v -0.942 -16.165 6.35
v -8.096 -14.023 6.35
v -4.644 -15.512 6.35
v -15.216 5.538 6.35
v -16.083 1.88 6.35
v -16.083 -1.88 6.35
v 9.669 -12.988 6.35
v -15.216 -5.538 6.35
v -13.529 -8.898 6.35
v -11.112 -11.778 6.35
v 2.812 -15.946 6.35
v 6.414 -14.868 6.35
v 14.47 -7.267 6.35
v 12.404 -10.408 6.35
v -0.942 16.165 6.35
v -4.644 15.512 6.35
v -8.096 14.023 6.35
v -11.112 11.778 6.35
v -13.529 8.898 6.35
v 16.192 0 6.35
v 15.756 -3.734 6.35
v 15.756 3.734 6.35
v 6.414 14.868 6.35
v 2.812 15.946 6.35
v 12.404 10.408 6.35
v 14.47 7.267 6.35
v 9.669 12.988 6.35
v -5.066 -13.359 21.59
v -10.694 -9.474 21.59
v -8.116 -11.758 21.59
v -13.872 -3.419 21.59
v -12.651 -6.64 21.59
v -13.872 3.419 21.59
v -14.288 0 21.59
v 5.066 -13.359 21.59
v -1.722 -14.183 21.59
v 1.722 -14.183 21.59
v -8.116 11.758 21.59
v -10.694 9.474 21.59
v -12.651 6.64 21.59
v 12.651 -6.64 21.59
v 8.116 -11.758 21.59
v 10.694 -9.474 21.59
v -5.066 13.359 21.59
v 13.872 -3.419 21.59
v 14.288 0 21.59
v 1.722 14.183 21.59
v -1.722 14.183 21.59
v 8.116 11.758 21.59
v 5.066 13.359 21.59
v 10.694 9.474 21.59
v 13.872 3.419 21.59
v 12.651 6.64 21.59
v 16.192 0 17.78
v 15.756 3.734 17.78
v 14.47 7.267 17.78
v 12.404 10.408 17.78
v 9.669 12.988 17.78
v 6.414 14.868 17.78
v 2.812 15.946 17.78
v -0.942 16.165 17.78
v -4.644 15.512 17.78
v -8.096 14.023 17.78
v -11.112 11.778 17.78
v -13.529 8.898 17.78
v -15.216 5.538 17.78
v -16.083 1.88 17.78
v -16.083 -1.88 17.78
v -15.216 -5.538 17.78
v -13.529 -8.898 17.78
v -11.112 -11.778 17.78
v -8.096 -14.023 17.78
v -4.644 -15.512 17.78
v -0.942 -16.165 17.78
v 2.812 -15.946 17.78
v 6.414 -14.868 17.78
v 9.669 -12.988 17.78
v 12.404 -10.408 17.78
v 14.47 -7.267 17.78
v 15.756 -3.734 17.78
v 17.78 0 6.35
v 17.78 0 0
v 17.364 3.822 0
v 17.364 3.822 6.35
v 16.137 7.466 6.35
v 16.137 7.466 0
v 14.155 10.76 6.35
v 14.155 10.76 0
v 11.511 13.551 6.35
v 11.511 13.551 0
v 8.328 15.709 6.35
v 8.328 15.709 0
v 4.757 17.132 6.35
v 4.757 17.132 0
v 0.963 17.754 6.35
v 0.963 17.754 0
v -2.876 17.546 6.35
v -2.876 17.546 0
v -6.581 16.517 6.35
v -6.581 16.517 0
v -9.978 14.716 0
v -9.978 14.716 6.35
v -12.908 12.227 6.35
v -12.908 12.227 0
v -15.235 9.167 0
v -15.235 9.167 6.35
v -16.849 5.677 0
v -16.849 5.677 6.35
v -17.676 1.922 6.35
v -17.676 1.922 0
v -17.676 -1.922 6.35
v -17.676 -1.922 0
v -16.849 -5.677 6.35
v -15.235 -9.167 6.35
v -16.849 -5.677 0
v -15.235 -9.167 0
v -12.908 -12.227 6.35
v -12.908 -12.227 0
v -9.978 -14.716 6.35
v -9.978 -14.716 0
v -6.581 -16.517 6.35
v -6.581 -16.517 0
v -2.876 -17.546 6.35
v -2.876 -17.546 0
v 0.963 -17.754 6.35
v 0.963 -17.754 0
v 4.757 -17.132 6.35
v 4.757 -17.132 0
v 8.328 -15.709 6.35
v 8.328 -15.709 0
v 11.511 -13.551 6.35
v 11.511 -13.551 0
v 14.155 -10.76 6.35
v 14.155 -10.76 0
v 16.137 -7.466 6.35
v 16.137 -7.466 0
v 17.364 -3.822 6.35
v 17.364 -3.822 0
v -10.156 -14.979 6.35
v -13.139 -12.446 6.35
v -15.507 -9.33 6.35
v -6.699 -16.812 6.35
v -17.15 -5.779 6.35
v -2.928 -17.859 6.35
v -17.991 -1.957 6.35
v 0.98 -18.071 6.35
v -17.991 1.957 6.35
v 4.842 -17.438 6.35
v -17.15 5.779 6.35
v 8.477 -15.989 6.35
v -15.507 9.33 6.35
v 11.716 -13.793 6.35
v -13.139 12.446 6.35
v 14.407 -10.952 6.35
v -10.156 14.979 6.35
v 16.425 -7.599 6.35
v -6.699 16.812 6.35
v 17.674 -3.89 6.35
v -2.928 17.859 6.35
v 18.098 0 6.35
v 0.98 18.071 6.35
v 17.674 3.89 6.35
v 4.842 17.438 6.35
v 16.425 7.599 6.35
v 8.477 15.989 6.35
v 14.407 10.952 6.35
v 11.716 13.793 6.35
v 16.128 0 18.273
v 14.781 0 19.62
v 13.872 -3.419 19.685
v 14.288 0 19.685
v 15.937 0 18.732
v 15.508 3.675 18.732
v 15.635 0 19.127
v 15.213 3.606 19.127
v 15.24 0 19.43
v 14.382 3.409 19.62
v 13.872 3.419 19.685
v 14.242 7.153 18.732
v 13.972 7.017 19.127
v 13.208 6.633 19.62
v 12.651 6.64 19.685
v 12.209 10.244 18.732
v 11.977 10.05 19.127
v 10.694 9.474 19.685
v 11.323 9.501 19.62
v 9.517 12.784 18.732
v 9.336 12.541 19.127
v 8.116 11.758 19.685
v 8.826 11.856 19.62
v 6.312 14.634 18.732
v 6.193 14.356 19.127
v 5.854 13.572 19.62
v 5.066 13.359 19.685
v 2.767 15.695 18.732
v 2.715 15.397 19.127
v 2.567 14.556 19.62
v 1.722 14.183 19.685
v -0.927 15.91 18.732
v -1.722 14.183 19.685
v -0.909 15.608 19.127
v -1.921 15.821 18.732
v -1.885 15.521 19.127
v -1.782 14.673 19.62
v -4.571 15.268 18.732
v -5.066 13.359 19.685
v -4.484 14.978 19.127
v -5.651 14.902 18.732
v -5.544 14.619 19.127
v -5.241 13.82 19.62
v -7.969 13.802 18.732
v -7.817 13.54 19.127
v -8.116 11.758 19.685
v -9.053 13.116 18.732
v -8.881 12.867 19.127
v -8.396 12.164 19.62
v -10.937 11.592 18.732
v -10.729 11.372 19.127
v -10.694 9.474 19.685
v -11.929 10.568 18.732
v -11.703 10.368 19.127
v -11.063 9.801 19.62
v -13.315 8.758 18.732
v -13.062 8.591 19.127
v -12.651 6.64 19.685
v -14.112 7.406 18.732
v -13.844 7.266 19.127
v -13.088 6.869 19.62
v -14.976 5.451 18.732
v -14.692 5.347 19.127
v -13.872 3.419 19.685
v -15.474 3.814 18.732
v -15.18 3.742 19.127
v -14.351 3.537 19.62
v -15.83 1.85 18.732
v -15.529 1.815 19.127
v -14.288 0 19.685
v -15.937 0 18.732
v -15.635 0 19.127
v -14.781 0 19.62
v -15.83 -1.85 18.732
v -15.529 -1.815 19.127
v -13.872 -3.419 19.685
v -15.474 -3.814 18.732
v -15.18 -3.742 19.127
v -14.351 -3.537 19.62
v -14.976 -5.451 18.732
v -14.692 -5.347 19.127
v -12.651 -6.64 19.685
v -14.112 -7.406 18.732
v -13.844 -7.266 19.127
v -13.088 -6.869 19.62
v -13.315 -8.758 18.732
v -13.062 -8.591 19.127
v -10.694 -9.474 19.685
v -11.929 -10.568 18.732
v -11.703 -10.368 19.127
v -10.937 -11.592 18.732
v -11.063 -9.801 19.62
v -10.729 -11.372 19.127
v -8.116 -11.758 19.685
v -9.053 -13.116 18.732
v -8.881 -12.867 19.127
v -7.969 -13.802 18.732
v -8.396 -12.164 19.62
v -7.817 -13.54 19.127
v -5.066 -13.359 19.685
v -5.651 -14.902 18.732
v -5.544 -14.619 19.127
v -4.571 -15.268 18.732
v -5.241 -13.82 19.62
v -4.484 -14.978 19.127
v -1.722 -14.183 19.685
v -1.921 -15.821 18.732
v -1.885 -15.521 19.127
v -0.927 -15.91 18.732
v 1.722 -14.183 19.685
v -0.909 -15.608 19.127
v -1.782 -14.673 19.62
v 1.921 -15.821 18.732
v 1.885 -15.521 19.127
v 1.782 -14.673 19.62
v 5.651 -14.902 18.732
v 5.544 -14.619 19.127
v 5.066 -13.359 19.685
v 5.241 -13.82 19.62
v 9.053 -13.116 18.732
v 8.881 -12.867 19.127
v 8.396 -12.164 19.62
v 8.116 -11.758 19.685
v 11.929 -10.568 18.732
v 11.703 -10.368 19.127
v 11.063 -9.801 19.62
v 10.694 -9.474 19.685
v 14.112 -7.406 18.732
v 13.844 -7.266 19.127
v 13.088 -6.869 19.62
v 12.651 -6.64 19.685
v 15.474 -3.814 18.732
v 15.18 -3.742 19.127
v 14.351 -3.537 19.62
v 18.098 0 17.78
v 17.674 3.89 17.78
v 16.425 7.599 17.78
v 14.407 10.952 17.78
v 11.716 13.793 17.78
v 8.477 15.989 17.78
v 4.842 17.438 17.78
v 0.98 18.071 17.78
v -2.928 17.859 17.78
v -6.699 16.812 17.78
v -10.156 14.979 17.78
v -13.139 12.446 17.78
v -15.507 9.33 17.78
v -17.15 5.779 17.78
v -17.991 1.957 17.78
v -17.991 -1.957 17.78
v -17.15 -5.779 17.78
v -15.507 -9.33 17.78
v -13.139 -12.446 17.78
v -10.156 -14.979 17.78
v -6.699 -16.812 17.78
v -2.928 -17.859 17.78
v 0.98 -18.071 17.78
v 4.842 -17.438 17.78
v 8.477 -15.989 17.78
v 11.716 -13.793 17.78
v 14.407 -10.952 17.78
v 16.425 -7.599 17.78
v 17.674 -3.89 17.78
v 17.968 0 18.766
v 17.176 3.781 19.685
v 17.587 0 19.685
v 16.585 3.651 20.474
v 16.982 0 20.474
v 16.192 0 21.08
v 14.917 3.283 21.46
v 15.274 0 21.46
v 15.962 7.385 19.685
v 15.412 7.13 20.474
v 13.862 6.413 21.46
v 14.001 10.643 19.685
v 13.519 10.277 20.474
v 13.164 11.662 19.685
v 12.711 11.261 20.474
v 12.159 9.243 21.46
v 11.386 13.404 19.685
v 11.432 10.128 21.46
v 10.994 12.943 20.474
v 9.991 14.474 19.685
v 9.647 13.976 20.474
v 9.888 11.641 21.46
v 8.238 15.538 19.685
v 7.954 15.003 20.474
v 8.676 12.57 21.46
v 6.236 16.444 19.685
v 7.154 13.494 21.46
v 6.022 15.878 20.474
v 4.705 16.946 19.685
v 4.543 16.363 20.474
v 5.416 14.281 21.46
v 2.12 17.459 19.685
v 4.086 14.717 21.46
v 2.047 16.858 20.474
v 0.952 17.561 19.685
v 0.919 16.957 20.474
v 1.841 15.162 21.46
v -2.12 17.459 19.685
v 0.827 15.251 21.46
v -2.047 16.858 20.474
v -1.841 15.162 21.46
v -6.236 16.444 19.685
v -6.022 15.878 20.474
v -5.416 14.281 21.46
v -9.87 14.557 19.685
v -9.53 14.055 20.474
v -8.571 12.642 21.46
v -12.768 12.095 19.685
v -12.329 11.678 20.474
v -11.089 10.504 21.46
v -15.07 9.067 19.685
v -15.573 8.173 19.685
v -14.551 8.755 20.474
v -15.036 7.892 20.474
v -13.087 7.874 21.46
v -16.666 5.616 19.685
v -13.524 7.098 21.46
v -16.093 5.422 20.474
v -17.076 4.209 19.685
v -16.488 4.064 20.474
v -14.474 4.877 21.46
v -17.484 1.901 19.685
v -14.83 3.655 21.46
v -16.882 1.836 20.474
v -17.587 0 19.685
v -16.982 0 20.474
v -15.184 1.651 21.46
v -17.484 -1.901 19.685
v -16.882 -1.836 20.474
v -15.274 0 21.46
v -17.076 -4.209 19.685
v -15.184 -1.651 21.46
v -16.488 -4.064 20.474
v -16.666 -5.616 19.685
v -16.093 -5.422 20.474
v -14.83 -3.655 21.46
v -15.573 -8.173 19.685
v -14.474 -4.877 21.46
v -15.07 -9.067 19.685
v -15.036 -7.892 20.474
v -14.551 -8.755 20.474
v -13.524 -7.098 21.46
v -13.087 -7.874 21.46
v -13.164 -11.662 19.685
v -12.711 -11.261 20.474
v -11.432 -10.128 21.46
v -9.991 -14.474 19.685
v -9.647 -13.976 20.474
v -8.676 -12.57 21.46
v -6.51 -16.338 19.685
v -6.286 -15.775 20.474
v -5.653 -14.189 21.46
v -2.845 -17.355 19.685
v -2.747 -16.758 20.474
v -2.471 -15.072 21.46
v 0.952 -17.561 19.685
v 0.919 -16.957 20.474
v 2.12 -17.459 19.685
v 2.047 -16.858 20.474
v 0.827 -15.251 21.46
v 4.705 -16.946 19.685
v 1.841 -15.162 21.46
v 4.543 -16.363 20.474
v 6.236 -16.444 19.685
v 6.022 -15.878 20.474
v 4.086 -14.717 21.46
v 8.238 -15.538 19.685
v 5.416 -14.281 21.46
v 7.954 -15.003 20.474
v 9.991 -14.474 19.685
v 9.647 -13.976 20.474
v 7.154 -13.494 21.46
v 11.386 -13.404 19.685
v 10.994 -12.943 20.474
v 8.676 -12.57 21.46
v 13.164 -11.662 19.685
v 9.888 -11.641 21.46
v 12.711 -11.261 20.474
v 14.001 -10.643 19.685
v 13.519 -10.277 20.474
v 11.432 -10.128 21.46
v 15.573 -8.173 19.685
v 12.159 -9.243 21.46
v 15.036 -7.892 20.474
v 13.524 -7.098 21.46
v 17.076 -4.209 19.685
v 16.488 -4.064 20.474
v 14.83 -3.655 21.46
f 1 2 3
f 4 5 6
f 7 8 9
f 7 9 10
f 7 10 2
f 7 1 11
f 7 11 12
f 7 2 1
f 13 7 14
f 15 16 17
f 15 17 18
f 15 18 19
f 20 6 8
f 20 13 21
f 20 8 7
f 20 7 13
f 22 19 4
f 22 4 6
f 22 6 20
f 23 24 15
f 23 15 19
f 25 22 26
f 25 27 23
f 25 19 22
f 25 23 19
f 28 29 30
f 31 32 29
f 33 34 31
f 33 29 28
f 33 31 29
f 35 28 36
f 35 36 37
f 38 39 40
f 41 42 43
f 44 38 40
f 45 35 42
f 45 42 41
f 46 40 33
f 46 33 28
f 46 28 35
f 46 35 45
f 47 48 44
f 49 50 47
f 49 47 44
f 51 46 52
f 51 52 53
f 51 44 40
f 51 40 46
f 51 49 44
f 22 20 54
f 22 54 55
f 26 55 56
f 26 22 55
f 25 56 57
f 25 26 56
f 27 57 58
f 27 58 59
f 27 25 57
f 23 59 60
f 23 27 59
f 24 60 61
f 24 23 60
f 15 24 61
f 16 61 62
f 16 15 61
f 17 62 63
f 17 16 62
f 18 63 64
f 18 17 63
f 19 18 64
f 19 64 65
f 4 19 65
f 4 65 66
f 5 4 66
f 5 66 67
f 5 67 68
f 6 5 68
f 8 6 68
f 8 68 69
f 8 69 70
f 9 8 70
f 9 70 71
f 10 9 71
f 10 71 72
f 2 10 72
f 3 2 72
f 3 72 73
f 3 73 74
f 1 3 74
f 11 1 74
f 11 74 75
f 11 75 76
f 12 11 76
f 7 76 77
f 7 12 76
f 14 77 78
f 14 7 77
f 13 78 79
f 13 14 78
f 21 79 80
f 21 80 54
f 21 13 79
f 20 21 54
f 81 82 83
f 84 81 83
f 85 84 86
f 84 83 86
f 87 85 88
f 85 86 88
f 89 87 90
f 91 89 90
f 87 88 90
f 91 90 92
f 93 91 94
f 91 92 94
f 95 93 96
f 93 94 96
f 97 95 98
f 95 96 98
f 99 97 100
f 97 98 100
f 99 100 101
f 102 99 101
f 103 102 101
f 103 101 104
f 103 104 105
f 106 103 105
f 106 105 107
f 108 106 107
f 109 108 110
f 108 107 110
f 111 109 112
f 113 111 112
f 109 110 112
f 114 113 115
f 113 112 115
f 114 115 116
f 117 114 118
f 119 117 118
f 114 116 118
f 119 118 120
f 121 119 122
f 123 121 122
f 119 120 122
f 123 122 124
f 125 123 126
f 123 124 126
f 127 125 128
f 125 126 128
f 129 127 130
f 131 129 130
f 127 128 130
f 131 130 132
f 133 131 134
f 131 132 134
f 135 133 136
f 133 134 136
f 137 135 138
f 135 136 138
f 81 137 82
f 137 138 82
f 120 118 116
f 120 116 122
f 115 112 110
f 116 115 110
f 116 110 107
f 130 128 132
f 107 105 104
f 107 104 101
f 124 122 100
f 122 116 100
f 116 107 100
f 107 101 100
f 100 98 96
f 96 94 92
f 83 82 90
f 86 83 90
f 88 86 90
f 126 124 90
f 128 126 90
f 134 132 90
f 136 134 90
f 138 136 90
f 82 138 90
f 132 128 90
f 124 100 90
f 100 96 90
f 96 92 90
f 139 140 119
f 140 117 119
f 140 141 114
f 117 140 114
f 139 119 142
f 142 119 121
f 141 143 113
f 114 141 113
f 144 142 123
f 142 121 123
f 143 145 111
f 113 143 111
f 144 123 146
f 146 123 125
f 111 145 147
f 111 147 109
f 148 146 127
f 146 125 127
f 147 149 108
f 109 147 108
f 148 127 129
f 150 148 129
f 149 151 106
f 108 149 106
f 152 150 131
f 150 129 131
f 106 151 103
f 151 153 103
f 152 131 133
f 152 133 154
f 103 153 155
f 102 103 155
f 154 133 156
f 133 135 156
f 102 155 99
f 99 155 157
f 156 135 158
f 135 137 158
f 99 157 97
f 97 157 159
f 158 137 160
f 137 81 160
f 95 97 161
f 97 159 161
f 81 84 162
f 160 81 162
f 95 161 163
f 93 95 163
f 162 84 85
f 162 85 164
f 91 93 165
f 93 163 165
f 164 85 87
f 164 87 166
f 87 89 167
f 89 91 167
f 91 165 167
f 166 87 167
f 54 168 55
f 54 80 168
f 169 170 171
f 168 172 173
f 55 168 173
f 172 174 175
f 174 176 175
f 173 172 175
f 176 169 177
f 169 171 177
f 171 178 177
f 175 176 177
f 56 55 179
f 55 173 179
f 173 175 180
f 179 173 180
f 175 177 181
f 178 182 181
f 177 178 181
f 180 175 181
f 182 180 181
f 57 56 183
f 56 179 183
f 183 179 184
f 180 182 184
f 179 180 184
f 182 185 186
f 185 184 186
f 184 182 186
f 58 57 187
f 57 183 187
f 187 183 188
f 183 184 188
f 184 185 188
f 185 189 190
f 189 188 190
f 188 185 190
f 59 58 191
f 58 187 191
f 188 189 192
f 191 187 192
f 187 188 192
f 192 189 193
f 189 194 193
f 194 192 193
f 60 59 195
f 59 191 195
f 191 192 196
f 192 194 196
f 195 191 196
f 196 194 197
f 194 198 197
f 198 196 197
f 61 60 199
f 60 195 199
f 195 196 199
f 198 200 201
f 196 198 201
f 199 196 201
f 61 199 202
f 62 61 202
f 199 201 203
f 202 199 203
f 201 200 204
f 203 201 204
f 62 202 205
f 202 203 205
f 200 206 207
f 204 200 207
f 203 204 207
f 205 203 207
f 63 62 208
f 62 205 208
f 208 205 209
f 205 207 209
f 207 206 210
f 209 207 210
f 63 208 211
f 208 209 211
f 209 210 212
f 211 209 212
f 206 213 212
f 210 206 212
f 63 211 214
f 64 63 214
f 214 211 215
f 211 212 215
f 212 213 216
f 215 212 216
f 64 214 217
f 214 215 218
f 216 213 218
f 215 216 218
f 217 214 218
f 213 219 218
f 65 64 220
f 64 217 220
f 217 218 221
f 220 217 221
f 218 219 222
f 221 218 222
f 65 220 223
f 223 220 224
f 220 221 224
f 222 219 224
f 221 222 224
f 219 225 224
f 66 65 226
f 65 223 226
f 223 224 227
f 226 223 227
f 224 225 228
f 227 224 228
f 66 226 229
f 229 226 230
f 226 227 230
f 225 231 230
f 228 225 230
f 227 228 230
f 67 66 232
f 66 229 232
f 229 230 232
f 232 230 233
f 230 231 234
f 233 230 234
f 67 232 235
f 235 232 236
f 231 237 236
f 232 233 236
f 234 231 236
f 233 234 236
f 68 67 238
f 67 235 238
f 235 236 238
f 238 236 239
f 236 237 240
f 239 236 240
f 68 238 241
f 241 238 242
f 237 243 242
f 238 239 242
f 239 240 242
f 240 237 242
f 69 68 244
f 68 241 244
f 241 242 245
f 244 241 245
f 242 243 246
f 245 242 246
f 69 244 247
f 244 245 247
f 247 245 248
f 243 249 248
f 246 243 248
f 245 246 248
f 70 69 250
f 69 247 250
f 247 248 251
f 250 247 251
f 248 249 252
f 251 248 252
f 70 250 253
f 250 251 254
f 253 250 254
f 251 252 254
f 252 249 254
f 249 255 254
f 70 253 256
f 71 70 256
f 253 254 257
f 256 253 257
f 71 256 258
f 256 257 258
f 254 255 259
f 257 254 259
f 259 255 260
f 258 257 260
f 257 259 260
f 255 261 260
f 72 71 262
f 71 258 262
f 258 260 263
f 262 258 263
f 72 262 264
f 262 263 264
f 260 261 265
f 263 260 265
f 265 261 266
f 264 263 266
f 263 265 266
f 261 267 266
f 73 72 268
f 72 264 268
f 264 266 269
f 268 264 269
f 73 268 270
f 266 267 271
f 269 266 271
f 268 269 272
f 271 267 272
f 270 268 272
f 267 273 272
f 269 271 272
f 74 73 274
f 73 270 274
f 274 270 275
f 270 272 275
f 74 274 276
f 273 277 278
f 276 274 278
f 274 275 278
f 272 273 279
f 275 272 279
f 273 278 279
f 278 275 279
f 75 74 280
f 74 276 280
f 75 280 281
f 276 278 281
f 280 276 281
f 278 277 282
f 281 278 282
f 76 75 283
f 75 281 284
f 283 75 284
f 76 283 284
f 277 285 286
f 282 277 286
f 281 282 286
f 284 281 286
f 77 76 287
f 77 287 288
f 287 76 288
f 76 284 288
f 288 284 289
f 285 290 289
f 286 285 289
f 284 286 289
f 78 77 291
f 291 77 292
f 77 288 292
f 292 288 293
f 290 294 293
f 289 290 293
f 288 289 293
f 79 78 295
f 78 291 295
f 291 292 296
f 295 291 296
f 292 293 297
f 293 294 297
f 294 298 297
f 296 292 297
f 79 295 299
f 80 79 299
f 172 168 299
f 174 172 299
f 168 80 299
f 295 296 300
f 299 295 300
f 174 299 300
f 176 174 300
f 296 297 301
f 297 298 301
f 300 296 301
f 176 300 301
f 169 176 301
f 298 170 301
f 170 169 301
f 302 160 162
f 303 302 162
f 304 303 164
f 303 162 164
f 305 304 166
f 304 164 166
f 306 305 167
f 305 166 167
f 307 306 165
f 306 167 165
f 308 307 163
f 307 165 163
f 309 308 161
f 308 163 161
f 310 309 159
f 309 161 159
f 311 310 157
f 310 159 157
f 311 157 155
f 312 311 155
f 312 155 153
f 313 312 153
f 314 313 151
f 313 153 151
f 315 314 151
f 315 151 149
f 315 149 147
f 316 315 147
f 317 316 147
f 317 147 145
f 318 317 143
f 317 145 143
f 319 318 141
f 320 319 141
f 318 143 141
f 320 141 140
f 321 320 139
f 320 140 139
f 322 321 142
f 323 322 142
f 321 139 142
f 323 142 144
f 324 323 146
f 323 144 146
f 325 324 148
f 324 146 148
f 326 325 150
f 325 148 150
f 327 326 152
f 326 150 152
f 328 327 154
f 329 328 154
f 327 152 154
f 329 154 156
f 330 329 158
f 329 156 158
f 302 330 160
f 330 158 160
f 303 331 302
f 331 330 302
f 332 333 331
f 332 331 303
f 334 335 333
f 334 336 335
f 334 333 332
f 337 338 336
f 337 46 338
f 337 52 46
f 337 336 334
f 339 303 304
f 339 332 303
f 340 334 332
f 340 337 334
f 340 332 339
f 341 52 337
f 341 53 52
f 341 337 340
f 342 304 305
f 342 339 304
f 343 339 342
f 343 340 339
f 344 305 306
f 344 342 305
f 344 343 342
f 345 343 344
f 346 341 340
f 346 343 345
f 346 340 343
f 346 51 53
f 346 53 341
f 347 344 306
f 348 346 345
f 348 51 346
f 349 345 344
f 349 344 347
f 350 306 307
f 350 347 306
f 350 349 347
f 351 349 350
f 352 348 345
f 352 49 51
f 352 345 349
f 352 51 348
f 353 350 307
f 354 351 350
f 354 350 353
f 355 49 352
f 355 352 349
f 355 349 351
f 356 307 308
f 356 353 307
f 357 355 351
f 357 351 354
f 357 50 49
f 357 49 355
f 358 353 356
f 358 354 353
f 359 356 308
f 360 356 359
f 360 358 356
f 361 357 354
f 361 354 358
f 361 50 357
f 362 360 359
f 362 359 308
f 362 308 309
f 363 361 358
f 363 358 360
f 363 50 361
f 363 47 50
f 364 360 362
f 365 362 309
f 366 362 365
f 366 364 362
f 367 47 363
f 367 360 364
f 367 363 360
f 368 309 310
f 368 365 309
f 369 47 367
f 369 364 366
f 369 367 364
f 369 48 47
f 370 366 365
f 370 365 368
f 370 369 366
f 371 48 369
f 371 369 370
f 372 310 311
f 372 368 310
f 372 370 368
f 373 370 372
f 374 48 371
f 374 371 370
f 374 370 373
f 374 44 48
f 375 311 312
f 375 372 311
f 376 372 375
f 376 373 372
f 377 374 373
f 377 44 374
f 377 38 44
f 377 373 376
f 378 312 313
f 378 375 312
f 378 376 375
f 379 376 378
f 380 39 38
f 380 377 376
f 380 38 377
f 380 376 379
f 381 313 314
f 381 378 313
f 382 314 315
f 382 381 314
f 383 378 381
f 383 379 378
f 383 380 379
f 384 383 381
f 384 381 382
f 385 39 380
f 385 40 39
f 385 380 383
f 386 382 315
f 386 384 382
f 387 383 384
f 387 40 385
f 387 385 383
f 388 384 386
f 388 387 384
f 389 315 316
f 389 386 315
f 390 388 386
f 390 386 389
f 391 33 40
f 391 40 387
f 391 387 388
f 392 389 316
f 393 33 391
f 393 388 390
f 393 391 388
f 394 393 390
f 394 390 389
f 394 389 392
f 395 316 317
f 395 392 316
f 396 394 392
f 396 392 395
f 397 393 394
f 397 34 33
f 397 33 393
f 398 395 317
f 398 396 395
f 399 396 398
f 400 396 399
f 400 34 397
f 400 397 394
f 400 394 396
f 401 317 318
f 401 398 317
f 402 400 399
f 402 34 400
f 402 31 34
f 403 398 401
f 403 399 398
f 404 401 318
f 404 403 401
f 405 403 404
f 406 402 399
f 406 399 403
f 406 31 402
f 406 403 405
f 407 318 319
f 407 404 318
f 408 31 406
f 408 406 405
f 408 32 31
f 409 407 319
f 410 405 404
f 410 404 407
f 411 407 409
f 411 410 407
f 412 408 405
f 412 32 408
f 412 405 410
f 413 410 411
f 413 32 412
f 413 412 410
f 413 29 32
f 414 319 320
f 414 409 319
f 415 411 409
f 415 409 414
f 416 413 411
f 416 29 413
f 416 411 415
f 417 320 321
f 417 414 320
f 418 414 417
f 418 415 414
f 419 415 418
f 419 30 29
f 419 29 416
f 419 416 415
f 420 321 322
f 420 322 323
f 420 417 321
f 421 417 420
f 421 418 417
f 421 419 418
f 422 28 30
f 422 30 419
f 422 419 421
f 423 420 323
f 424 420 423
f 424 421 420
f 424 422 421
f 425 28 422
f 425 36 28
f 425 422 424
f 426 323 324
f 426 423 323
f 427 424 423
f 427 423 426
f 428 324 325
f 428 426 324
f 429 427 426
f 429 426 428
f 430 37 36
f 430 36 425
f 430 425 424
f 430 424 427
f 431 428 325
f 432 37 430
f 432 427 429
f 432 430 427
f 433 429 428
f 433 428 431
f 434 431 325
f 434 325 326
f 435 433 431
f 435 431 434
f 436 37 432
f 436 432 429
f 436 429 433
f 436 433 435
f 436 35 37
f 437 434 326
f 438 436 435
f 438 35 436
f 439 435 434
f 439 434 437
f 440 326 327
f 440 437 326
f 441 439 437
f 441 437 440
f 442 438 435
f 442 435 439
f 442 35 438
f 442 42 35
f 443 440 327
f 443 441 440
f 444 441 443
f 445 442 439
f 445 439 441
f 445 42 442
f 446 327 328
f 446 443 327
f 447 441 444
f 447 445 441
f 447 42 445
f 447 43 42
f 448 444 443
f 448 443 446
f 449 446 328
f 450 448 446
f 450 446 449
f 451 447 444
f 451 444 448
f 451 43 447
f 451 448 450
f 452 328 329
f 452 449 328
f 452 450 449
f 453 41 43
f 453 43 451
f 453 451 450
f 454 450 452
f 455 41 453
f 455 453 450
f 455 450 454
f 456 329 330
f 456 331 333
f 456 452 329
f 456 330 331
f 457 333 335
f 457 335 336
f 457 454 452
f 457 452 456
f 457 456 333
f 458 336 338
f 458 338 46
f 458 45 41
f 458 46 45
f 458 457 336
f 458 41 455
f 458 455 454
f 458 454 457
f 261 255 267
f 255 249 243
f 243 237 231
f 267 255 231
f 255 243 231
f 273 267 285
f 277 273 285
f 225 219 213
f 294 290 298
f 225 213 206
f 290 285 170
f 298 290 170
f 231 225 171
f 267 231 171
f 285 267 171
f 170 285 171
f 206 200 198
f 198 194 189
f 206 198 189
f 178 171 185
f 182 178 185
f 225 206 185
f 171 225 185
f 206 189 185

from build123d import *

# Parameters (mm, degrees)
F1_R     = 18.0975
F2_DEPTH = 15.24
F3_R     = 3.81
F5_T     = -1.905
F4_R     = 17.78
F6_DEPTH = 6.35


with BuildPart() as f2:
    # F1 (on offset) → F2 (new body)
    with BuildSketch(Plane.XY.offset(6.35)):
        Circle(F1_R)
    extrude(amount=F2_DEPTH)

    # F3
    f3_edges = [f2.edges().sort_by_distance(p)[0] for p in [
        (-18.0975, 0, 21.59),
    ]]
    fillet(f3_edges, radius=F3_R)

    # F5
    f5_openings = [f2.faces().sort_by_distance(p)[0] for p in [
        (0, 0, 6.35),
    ]]
    offset(amount=F5_T, openings=f5_openings)

    # F4 (on Top) → F6 (join)
    with BuildSketch(Plane.XY):
        Circle(F4_R)
    extrude(amount=F6_DEPTH)


solid = f2.part
